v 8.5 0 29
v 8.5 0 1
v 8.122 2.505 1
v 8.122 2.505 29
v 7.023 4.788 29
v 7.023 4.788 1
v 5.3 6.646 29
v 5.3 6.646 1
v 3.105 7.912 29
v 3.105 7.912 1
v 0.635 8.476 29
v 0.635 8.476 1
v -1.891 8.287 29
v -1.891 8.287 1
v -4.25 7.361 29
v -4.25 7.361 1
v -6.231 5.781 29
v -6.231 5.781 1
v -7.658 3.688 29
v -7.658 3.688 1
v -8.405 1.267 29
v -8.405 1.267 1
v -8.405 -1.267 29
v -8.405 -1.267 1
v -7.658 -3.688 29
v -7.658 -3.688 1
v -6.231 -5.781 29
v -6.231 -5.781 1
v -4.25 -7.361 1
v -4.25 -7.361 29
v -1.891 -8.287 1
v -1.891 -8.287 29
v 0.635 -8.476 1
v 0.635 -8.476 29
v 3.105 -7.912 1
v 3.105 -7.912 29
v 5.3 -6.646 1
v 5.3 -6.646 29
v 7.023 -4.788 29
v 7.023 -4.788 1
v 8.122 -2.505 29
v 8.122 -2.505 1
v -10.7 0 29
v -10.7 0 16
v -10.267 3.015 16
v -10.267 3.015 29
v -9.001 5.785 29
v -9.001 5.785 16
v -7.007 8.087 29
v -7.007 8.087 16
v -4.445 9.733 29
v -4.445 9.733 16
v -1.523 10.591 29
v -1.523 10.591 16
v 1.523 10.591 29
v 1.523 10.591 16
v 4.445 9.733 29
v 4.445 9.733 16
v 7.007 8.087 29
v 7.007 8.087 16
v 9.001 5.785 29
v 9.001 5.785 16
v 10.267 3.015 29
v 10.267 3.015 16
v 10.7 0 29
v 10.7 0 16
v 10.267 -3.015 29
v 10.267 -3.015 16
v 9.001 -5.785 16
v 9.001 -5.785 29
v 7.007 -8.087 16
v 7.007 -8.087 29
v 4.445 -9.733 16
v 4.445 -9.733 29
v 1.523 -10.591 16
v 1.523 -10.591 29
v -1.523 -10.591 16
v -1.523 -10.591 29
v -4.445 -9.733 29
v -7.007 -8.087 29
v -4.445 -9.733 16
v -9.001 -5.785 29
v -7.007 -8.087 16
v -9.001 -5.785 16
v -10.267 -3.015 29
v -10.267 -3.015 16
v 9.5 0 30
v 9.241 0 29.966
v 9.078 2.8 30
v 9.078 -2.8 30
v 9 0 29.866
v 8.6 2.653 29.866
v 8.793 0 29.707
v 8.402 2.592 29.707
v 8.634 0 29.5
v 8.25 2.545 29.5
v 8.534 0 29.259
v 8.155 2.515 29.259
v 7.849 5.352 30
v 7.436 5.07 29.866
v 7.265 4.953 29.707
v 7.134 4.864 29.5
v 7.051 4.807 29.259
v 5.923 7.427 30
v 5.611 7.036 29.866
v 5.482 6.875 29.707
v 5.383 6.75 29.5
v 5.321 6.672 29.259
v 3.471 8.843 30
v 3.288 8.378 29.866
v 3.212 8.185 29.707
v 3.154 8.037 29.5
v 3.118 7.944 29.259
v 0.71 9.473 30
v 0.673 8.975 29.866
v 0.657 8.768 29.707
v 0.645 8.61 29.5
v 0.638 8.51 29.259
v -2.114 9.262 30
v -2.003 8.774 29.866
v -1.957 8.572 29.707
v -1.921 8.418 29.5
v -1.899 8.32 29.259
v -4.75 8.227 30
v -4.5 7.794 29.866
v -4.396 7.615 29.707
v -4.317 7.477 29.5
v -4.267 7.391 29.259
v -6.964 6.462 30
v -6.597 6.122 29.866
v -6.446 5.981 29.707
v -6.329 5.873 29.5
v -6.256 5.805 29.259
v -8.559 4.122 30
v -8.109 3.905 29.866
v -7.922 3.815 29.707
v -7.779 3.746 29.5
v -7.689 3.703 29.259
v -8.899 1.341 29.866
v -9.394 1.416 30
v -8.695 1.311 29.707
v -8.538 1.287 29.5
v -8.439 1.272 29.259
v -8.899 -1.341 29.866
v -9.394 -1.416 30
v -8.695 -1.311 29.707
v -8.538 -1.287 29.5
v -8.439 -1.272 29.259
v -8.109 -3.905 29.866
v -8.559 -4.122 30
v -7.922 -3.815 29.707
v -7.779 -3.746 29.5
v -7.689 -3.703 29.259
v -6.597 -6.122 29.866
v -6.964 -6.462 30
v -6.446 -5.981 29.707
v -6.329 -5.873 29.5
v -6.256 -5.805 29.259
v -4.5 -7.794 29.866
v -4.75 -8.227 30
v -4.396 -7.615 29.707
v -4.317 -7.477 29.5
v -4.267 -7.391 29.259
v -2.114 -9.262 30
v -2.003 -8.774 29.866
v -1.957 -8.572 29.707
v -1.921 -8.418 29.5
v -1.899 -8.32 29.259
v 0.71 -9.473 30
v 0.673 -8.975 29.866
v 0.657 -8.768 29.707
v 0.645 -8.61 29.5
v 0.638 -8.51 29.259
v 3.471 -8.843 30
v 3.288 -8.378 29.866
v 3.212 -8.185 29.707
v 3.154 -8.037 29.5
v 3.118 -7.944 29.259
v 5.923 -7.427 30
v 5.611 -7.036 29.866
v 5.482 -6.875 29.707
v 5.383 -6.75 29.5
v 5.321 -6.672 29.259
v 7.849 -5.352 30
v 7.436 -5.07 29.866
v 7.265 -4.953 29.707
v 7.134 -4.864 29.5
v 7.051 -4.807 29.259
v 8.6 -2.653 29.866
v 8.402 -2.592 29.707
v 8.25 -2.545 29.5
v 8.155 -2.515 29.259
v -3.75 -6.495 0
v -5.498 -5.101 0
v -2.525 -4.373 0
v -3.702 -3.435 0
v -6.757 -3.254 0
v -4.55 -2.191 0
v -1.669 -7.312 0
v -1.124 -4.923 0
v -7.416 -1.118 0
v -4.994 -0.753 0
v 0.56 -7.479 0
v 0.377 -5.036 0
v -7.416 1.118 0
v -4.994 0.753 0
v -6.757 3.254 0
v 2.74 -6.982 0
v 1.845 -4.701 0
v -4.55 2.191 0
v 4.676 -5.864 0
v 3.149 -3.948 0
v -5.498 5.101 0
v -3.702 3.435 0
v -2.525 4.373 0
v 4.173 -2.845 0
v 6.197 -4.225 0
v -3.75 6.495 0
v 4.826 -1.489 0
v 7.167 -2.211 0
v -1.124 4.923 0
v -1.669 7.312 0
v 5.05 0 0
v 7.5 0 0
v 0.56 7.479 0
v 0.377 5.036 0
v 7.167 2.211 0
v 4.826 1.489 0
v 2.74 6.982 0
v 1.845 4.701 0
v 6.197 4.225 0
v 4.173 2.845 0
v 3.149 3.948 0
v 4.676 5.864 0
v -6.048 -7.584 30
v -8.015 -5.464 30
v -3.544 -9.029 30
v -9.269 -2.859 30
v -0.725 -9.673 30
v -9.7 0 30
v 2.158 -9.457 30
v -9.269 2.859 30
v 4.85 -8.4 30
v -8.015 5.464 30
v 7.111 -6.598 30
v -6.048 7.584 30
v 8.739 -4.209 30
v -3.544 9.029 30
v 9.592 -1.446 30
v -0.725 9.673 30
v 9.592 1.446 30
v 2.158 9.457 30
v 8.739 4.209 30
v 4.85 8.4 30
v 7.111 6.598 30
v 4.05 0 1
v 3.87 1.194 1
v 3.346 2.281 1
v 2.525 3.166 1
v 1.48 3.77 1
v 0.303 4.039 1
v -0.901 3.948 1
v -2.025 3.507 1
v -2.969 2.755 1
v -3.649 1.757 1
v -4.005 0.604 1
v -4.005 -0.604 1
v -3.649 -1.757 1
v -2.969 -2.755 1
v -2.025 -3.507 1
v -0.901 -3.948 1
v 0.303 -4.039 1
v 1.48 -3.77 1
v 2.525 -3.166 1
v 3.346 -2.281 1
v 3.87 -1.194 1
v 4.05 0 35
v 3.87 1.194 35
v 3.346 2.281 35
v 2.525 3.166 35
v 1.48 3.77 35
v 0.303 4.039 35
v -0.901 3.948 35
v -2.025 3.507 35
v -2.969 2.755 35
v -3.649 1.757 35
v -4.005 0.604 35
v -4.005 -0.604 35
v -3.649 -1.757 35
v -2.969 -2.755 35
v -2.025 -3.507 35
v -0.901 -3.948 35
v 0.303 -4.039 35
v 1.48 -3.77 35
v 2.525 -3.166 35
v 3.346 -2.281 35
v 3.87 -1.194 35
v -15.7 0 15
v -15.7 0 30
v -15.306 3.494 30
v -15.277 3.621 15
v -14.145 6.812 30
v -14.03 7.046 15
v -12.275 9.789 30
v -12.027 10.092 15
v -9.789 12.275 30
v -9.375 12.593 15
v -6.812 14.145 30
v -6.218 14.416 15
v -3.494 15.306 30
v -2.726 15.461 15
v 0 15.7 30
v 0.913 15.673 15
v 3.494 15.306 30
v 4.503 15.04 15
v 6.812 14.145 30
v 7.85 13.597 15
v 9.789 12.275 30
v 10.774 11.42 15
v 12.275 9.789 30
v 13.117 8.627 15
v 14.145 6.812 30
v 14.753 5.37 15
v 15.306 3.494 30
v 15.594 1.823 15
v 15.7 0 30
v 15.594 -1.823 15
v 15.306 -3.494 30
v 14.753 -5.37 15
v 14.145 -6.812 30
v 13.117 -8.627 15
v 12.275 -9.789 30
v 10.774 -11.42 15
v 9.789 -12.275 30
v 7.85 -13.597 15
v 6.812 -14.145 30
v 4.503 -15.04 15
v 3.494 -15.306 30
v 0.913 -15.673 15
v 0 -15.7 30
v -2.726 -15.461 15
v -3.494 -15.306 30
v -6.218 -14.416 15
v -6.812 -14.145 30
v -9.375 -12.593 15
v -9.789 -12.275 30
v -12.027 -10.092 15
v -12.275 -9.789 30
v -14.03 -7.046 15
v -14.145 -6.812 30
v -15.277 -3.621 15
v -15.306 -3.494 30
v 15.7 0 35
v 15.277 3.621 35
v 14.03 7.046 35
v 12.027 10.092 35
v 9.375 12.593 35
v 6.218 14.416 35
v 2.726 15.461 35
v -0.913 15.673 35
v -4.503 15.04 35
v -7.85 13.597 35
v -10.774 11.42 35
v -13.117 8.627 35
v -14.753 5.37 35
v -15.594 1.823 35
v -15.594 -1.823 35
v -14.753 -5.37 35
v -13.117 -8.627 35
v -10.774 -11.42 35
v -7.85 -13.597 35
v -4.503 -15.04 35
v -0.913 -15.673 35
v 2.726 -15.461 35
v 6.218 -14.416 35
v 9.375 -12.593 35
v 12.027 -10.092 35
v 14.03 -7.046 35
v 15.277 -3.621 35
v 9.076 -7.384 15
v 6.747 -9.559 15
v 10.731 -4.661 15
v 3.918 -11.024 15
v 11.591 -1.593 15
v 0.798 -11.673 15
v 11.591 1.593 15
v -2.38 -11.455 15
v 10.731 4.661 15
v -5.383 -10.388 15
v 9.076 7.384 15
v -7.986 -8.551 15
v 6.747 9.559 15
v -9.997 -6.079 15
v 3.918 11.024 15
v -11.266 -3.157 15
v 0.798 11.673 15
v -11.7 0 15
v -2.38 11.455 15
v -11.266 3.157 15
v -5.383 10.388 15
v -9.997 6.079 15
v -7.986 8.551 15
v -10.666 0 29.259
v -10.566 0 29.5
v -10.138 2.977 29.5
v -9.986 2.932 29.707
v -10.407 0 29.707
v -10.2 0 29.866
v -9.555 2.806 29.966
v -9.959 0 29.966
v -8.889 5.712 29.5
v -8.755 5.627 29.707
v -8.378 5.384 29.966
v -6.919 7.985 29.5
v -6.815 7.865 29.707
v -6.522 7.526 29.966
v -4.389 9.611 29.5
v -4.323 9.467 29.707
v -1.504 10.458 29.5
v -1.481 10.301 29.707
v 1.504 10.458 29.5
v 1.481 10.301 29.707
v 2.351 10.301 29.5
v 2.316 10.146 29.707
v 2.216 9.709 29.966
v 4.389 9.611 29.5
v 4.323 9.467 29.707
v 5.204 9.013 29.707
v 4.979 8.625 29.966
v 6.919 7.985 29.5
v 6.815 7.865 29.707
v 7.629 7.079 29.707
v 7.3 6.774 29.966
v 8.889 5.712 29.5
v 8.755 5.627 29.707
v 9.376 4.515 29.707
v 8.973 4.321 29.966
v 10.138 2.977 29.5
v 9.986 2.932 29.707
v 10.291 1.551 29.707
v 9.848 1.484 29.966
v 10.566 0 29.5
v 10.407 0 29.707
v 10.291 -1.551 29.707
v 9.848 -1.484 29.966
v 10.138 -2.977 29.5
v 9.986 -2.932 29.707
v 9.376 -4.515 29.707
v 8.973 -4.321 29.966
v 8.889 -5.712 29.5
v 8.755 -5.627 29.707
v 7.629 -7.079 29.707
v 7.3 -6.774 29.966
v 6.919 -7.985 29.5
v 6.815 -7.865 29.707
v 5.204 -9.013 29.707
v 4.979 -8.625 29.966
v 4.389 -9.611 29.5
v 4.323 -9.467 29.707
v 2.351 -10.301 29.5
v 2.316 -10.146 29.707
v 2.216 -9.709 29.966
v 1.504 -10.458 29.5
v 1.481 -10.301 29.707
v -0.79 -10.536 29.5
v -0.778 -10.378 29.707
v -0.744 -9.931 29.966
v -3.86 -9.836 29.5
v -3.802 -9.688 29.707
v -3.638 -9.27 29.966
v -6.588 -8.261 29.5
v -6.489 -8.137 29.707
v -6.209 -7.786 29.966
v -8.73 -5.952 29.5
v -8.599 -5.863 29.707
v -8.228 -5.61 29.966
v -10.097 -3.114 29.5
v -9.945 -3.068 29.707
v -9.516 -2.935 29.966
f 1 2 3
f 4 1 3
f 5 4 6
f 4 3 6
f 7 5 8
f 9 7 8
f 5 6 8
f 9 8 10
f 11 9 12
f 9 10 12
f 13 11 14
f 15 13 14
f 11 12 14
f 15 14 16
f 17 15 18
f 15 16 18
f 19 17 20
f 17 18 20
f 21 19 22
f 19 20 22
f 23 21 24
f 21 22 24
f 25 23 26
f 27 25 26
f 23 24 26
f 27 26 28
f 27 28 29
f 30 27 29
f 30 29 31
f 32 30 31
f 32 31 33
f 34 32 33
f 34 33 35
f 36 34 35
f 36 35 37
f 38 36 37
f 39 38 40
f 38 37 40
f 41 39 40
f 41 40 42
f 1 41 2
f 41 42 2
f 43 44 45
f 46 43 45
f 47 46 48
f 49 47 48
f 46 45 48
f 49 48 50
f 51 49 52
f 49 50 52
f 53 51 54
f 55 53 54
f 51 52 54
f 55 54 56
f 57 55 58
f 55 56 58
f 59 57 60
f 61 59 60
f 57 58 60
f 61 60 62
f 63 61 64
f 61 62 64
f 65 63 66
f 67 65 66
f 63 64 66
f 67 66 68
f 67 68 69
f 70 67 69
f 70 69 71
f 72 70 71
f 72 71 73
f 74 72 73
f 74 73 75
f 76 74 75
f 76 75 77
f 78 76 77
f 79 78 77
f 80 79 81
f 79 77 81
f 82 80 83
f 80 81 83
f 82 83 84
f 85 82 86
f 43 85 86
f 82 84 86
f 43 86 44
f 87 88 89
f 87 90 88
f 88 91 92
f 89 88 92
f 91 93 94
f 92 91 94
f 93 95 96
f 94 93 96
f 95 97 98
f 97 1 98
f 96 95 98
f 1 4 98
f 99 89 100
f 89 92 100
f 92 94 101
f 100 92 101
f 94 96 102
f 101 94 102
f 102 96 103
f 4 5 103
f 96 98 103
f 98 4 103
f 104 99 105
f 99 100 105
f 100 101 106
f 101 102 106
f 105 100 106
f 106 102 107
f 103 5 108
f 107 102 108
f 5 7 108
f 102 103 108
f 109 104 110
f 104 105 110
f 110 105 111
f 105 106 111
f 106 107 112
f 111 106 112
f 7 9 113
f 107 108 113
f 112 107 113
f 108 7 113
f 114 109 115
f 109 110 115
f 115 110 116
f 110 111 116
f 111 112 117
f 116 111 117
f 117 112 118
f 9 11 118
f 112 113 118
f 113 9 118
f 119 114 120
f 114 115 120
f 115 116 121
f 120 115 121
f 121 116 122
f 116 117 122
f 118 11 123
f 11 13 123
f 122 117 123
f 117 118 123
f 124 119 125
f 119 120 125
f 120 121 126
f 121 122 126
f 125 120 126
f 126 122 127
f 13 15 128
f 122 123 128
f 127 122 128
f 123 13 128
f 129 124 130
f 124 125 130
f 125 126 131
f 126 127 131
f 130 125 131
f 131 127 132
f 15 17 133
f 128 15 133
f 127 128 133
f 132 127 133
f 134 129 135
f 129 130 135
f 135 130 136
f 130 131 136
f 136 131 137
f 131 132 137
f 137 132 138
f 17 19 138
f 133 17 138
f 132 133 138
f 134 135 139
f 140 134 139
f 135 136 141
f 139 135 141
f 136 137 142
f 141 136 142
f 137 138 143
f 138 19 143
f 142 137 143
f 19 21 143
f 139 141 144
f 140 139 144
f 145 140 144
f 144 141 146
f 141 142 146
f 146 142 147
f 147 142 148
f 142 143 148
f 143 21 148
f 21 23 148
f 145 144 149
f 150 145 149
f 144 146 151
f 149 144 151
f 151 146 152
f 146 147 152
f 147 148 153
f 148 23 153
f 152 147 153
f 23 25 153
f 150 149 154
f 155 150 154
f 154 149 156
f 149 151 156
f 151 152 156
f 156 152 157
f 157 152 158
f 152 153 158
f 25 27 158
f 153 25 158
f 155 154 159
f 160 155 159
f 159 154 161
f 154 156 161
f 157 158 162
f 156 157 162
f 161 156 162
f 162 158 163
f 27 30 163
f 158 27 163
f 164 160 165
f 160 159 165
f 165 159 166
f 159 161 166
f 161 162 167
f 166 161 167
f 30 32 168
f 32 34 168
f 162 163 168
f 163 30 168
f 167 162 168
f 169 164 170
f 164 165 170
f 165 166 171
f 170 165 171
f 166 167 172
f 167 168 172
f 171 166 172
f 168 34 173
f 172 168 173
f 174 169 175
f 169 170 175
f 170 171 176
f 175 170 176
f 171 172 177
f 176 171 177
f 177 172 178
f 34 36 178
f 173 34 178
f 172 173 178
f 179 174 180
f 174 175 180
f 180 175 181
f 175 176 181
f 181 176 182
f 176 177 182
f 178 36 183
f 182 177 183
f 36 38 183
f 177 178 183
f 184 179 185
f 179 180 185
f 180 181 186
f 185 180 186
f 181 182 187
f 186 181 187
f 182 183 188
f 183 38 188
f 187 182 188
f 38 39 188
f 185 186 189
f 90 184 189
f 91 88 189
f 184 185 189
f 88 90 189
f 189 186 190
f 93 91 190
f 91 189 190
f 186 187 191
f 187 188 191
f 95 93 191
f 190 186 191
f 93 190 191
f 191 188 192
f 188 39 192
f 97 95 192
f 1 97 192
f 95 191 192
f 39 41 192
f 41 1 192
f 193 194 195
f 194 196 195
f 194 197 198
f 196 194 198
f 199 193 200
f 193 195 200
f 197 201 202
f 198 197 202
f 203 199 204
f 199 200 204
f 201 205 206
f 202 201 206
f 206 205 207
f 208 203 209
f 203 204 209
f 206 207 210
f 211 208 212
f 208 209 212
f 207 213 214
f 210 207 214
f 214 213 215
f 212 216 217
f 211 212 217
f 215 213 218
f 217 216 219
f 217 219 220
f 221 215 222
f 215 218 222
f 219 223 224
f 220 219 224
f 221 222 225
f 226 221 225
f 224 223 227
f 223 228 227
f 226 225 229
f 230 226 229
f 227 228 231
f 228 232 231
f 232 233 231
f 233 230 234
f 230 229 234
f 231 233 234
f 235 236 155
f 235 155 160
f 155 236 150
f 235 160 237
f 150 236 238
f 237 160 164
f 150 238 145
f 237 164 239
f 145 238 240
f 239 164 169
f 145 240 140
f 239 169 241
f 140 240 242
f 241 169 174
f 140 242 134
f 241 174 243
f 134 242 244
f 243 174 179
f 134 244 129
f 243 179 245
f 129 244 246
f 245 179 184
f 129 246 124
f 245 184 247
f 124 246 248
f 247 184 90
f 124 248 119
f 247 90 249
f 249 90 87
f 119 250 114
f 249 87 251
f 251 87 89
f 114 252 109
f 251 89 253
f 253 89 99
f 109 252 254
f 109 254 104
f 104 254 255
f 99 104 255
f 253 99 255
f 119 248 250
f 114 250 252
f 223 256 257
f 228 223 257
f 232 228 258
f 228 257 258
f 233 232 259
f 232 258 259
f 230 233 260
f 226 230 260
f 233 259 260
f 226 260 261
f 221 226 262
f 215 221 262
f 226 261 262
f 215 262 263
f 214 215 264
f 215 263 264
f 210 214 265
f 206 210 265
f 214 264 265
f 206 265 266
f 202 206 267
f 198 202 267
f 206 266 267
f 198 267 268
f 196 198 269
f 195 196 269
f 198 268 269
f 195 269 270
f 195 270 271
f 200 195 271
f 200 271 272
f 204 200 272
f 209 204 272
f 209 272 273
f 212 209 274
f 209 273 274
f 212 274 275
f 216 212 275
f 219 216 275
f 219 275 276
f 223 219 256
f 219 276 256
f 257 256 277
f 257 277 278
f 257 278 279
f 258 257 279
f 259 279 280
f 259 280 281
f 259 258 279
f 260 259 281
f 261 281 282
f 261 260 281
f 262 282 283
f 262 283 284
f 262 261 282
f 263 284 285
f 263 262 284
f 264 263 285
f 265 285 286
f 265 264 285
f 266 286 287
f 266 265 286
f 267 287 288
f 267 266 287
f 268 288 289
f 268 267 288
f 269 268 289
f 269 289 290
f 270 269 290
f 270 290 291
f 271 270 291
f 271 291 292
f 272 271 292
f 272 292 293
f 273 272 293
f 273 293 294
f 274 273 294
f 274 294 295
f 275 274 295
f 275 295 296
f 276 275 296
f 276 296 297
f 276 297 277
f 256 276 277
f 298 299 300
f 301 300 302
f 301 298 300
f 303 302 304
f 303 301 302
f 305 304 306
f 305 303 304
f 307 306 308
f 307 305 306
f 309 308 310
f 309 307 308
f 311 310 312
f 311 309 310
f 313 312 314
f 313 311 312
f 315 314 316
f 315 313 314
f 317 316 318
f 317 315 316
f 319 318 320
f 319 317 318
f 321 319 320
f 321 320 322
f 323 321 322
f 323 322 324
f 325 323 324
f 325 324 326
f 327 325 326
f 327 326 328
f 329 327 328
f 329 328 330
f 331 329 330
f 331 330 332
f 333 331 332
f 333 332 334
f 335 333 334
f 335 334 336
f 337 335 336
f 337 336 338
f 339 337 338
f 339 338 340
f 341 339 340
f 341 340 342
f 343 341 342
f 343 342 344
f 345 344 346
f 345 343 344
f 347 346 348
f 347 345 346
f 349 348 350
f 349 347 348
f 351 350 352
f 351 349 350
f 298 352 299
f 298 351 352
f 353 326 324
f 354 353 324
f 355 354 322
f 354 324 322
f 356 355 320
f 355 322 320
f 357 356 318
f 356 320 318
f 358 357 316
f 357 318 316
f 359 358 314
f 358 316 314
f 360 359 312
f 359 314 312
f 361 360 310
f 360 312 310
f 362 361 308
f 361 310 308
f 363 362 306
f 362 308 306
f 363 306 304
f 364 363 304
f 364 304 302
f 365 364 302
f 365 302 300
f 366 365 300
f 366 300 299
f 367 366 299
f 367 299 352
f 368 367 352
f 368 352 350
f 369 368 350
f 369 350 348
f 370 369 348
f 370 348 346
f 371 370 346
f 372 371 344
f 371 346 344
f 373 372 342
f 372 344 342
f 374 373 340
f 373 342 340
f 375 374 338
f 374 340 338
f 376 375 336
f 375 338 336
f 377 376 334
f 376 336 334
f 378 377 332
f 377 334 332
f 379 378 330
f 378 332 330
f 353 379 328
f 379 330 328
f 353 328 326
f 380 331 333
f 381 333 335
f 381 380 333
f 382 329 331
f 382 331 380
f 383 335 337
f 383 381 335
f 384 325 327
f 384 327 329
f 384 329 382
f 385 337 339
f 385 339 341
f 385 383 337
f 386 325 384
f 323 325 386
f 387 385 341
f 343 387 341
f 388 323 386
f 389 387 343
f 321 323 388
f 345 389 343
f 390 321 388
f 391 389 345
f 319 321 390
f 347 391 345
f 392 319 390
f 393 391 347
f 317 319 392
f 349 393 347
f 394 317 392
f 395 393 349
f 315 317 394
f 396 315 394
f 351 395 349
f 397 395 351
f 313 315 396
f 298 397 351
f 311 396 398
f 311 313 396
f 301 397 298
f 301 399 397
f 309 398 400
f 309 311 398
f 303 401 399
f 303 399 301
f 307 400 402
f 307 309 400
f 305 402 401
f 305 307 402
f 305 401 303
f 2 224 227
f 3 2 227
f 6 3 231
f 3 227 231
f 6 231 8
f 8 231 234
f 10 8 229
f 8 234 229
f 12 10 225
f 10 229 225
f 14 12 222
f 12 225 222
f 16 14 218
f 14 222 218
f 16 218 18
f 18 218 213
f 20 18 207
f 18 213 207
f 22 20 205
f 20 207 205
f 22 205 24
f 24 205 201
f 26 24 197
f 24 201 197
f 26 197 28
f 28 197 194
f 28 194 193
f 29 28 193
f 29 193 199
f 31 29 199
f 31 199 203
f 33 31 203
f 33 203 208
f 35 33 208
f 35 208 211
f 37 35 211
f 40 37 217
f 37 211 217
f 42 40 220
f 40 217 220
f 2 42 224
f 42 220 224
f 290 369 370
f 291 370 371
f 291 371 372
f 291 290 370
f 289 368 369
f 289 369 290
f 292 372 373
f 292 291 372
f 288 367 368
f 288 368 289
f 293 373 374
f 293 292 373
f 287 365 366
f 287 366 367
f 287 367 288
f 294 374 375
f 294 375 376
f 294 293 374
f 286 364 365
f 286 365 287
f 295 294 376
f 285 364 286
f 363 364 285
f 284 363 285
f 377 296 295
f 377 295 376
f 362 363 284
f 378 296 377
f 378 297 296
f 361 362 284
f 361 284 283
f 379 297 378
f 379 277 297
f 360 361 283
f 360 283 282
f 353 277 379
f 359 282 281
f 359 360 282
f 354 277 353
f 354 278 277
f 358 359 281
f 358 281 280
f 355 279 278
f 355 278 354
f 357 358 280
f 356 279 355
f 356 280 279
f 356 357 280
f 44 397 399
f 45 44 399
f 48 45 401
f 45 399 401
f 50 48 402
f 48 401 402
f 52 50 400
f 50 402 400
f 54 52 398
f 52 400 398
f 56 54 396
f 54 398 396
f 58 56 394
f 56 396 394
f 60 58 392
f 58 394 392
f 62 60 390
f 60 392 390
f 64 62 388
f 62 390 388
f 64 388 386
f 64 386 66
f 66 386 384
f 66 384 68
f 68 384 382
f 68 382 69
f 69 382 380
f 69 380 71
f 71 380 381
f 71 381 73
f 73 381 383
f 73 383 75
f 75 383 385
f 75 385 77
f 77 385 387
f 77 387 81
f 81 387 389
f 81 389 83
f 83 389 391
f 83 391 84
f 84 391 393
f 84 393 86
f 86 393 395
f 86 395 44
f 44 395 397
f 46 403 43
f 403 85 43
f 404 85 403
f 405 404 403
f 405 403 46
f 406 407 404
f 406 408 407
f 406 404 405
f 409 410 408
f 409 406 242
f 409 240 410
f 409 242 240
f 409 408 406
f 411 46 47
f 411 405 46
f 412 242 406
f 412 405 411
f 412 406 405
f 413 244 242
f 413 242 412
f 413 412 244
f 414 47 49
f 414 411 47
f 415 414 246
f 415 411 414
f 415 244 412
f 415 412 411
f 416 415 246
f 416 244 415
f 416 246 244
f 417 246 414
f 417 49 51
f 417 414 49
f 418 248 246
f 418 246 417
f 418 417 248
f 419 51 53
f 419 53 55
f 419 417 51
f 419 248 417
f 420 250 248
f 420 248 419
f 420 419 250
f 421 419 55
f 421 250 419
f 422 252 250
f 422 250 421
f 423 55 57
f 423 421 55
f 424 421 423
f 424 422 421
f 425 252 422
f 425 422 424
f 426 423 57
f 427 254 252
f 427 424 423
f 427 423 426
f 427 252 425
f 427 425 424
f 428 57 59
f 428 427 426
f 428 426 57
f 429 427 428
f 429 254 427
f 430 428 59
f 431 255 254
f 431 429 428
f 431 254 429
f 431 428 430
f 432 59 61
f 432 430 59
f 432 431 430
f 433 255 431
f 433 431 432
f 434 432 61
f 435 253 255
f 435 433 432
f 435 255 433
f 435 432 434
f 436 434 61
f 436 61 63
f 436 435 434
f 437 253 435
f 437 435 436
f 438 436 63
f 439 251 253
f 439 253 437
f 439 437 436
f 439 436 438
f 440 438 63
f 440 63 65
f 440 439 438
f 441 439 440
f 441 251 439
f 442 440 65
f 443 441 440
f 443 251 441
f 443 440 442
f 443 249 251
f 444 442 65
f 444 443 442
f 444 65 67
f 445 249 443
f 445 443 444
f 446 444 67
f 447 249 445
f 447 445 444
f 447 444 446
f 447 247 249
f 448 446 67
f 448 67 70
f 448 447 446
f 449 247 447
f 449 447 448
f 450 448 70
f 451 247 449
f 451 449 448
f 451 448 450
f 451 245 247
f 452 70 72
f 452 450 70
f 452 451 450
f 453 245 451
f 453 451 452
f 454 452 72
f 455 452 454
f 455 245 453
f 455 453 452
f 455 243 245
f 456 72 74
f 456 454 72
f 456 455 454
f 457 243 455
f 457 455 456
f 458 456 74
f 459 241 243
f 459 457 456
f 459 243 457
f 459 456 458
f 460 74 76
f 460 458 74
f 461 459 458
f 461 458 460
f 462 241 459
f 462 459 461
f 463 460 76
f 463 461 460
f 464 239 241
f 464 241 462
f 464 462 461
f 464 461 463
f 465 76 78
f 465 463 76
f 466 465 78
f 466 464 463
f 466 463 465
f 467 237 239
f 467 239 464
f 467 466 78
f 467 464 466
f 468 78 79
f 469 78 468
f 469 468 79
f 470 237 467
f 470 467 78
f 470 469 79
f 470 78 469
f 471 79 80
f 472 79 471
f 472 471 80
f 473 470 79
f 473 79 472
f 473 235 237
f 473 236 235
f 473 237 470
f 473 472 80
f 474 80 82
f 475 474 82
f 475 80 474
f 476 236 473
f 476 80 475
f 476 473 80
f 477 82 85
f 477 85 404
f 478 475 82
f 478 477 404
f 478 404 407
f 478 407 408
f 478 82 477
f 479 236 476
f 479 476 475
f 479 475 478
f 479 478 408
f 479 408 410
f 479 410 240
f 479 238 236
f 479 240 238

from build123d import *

# Parameters (mm, degrees)
SKETCH1_R           = 8.5
SKETCH1_R_2         = 4.05
BOSS_EXTRUDE1_DEPTH = 30
SKETCH2_R           = 15.7
SKETCH2_R_2         = 10.7
SKETCH2_R_3         = 8.5
SKETCH2_R_4         = 4.05
BOSS_EXTRUDE2_DEPTH = 5
BOSS_EXTRUDE3_START = 15
SKETCH3_R           = 15.7
SKETCH3_R_2         = 10.7
BOSS_EXTRUDE3_DEPTH = 15
FILLET1_R           = 1
CHAMFER1_SIZE       = 1
CHAMFER2_SIZE       = 1


with BuildPart() as part:
    # Sketch1 → Boss-Extrude1 (new body)
    with BuildSketch(Plane.XY):
        Circle(SKETCH1_R)
        Circle(SKETCH1_R_2, mode=Mode.SUBTRACT)
    extrude(amount=BOSS_EXTRUDE1_DEPTH)

    # Sketch2 → Boss-Extrude2 (add)
    # profile 1 of 3: a face of its own
    with BuildSketch(Plane.XY.offset(30)):
        Circle(SKETCH2_R)
        Circle(SKETCH2_R_2, mode=Mode.SUBTRACT)
    # profile 2 of 3: a face of its own
    with BuildSketch(Plane.XY.offset(30)):
        Circle(SKETCH2_R_2)
        Circle(SKETCH2_R_3, mode=Mode.SUBTRACT)
    # profile 3 of 3: a face of its own
    with BuildSketch(Plane.XY.offset(30)):
        Circle(SKETCH2_R_3)
        Circle(SKETCH2_R_4, mode=Mode.SUBTRACT)
    extrude(amount=BOSS_EXTRUDE2_DEPTH)

    # Sketch3 → Boss-Extrude3 (add)
    with BuildSketch(Plane(origin=(0, 0, 30), x_dir=(-1, 0, 0), z_dir=(0, 0, -1)).offset(BOSS_EXTRUDE3_START)):
        Circle(SKETCH3_R)
        Circle(SKETCH3_R_2, mode=Mode.SUBTRACT)
    extrude(amount=-BOSS_EXTRUDE3_DEPTH)

    # Fillet1
    fillet1_edges = [part.edges().sort_by_distance(p)[0] for p in [
        (10.7, 0, 30),
        (-8.5, 0, 30),
    ]]
    fillet(fillet1_edges, radius=FILLET1_R)

    # Chamfer1
    chamfer1_edges = [part.edges().sort_by_distance(p)[0] for p in [
        (10.7, 0, 15),
    ]]
    chamfer(chamfer1_edges, length=CHAMFER1_SIZE)

    # Chamfer2
    chamfer2_edges = [part.edges().sort_by_distance(p)[0] for p in [
        (-8.5, 0, 0),
        (-4.05, 0, 0),
    ]]
    chamfer(chamfer2_edges, length=CHAMFER2_SIZE)


solid = part.part
